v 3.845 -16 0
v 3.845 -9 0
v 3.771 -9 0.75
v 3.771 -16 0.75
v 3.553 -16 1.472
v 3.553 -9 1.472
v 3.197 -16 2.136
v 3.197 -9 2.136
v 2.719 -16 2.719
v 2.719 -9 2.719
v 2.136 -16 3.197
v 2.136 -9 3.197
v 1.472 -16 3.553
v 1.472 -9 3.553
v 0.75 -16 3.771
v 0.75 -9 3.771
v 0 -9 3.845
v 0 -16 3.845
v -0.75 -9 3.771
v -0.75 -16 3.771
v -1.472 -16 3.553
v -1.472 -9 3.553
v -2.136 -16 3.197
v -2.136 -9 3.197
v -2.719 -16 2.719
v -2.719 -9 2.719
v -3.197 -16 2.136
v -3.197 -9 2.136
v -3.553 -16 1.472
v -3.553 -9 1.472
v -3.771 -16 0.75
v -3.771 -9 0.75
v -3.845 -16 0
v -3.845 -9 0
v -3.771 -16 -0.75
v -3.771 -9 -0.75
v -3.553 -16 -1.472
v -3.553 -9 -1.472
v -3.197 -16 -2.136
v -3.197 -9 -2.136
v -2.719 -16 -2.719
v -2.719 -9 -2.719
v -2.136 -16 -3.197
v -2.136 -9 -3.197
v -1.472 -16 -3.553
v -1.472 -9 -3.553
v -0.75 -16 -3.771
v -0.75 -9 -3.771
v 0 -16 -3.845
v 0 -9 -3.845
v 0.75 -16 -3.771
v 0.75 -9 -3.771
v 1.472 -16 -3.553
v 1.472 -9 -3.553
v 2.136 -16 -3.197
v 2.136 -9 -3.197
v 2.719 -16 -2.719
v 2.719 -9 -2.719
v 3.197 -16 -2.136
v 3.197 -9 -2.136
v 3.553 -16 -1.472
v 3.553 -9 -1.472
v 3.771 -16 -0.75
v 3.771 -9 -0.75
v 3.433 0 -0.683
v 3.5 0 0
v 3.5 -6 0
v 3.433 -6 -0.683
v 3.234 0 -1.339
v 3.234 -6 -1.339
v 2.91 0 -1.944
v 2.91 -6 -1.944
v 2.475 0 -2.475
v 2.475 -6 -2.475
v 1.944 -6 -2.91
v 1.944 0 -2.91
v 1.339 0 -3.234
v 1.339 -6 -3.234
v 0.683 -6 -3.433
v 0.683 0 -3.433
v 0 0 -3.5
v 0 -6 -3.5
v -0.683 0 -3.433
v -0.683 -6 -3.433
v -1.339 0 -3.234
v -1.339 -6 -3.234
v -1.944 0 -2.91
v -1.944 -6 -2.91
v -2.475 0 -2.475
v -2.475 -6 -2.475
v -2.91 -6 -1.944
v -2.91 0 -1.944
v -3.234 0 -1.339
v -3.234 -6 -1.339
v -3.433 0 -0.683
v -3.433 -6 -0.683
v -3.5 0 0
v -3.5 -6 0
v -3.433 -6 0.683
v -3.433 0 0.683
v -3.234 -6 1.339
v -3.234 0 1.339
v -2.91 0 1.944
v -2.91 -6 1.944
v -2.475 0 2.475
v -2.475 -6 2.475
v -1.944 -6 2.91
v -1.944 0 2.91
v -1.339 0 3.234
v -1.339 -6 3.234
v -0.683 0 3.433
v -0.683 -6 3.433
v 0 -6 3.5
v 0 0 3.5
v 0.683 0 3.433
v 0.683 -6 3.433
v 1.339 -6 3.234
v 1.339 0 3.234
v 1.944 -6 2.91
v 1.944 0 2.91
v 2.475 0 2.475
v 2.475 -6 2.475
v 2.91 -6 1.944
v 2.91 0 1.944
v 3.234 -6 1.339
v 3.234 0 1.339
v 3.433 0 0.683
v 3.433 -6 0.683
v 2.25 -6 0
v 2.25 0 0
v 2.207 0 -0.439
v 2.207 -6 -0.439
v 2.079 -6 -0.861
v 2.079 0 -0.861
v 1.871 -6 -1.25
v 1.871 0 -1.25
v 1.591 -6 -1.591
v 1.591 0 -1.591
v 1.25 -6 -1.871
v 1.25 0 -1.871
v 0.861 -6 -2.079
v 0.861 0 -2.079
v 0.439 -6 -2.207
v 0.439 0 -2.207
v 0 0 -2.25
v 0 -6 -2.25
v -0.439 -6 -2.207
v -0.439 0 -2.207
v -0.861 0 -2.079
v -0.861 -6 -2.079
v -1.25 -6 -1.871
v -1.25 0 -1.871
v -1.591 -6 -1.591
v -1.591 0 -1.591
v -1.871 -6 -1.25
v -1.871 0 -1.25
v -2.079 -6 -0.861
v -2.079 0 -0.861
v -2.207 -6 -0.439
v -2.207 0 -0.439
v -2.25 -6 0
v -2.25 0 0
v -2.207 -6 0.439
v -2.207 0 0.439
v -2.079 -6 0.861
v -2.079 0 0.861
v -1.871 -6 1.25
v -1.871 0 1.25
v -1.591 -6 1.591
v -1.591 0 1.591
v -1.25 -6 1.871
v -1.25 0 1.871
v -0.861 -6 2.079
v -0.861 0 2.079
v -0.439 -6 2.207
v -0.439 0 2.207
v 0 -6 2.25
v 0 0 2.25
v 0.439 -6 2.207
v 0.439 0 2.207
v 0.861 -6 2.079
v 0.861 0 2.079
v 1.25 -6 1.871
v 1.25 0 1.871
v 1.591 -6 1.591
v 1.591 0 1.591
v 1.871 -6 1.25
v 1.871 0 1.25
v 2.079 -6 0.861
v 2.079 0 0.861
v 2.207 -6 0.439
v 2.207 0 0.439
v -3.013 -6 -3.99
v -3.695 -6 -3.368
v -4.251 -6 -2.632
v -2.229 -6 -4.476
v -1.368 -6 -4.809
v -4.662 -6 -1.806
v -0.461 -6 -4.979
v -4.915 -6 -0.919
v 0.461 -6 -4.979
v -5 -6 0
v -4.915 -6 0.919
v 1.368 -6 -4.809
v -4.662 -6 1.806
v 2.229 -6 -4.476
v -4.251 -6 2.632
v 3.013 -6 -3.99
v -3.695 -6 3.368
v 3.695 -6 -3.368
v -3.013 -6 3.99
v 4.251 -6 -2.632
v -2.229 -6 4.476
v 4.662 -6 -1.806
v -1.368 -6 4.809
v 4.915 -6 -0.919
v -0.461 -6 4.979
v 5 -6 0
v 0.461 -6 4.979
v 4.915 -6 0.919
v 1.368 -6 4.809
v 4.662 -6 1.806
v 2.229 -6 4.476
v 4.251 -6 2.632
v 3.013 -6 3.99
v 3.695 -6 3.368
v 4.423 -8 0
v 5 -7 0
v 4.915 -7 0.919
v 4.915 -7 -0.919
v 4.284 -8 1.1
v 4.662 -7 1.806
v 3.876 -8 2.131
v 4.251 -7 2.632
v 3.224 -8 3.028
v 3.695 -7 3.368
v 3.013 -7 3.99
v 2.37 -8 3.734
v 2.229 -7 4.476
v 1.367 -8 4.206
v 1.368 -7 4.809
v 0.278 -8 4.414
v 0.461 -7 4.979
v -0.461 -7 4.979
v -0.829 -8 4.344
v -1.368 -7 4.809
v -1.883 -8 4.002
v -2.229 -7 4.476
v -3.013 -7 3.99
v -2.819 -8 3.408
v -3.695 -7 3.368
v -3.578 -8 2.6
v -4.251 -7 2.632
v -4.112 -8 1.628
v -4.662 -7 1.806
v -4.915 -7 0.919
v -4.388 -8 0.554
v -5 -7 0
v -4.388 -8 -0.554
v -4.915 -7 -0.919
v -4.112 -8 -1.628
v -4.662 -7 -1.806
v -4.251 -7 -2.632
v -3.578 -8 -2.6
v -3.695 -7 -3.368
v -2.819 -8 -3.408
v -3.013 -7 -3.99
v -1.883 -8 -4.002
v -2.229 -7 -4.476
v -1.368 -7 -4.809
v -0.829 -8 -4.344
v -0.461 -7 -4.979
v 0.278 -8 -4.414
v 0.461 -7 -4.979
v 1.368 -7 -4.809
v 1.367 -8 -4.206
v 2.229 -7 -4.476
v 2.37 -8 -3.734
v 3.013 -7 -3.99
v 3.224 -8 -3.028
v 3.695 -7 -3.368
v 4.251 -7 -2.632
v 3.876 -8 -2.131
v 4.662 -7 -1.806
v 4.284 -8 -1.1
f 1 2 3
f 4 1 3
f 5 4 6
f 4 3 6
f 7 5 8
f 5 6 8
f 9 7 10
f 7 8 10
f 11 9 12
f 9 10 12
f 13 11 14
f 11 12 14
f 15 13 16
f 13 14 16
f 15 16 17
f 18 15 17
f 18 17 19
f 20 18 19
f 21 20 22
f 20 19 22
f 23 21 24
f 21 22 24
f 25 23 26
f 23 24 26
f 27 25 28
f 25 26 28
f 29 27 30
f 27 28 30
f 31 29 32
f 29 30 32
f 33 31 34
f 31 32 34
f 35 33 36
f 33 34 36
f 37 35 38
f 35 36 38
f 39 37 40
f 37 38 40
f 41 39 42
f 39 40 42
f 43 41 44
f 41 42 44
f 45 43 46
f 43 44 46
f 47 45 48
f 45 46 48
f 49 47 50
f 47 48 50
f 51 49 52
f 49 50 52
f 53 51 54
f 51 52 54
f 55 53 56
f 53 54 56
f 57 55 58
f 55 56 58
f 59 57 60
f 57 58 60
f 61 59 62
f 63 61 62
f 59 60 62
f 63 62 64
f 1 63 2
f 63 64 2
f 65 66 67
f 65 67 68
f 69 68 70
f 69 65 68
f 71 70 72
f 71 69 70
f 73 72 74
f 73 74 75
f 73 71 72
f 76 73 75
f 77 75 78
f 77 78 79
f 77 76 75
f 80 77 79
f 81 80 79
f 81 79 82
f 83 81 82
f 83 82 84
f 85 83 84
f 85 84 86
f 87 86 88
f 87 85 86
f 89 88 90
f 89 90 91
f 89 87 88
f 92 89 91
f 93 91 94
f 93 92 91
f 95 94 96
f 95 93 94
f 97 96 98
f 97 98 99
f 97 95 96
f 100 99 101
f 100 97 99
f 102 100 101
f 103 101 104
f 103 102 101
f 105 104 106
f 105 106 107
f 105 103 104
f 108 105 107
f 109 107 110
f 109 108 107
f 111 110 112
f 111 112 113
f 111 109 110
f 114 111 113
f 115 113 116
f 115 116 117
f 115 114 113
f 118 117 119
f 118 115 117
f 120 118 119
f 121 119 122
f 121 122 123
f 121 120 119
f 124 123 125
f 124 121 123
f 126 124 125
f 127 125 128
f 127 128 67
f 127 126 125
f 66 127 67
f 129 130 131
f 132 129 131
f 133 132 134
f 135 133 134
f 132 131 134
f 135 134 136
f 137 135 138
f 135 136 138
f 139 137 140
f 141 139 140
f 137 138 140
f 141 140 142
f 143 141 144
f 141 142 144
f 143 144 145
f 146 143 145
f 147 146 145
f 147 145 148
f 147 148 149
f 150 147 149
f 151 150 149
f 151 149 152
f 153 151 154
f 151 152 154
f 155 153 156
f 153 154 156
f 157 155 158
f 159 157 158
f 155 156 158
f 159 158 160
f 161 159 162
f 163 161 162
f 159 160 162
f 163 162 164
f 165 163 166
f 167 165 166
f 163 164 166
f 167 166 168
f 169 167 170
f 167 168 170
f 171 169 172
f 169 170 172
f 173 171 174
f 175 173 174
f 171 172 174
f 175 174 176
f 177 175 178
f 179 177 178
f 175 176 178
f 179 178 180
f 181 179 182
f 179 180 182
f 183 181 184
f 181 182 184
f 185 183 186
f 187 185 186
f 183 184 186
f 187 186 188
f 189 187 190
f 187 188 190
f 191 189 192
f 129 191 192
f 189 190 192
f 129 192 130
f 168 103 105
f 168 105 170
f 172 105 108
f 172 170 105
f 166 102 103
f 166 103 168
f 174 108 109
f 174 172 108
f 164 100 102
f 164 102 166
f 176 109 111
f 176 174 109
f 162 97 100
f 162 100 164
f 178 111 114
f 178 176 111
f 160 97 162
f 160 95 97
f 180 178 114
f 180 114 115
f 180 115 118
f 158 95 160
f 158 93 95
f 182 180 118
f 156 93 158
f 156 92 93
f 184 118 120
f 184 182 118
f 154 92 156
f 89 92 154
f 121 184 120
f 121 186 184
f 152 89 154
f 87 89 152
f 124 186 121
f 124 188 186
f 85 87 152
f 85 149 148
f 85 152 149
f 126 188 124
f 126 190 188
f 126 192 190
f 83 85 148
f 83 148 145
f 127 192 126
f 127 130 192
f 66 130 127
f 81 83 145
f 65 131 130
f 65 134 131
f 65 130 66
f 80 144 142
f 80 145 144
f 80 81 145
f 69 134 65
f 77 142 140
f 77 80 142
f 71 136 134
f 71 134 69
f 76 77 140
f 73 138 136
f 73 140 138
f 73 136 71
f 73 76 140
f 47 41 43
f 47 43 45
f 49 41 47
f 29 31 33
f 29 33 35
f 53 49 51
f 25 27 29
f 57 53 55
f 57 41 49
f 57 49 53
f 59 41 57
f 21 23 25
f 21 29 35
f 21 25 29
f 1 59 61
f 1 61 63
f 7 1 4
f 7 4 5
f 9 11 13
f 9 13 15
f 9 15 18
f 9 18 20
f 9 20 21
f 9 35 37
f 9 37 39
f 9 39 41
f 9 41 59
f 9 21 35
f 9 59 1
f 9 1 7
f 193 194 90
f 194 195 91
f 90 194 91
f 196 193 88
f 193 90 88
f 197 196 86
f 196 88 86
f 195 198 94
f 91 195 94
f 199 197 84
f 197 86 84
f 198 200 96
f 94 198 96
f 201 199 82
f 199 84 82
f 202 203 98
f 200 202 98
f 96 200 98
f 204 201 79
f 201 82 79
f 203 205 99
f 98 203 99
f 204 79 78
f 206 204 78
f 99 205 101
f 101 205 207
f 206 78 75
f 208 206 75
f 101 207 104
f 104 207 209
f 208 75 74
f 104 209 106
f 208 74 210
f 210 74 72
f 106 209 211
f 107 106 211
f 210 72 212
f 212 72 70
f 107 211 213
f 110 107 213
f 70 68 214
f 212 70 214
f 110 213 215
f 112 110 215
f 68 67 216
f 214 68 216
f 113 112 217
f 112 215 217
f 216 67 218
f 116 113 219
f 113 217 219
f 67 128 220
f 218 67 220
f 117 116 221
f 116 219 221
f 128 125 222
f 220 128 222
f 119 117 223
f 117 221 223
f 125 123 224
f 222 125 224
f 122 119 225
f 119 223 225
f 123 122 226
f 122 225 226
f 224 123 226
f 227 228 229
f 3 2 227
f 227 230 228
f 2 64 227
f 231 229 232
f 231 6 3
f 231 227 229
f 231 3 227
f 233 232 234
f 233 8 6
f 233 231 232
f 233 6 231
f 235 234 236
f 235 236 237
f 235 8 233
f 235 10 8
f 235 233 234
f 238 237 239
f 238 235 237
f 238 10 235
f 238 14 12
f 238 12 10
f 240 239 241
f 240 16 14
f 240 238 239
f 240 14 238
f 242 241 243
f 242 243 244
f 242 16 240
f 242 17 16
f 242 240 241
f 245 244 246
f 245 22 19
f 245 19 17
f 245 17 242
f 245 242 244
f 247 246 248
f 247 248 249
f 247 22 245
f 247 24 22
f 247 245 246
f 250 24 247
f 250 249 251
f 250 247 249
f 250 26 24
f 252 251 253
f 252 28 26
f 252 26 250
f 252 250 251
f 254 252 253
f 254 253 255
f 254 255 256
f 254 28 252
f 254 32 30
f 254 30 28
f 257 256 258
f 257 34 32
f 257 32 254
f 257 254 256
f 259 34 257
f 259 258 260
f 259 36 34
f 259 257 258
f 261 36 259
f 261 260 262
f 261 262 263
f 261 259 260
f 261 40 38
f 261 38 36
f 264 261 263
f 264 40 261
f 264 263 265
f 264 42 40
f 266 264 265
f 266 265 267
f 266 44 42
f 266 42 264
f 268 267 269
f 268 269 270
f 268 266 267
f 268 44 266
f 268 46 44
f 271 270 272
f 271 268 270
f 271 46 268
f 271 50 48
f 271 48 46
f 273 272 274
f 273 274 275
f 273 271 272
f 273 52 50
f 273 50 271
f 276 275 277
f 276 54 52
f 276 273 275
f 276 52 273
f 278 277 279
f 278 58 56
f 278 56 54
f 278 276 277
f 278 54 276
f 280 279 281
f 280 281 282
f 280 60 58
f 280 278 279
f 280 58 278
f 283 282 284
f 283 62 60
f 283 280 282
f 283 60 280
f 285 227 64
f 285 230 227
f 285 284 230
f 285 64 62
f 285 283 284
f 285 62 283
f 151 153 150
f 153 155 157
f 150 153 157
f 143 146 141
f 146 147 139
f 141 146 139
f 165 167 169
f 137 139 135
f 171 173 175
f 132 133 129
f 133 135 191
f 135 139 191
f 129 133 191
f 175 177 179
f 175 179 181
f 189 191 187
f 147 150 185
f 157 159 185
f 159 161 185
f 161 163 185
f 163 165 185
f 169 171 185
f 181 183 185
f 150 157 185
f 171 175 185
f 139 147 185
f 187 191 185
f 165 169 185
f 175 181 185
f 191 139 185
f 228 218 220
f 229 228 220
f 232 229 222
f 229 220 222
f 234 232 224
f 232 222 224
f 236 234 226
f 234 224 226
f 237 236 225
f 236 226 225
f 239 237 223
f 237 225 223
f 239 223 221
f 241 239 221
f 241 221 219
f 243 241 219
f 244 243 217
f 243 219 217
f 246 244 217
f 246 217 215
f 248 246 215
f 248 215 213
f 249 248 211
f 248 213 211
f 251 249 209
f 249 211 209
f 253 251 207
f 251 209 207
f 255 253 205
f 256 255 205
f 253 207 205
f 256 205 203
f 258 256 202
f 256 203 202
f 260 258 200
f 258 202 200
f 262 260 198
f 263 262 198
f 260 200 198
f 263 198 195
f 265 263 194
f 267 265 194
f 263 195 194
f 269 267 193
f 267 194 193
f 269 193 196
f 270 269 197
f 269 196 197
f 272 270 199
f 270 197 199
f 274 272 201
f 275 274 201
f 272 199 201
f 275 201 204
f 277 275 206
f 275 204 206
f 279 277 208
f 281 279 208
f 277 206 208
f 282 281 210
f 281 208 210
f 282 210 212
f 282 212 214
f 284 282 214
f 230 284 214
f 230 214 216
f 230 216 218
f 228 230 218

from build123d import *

# Parameters (mm, degrees)
SKETCH1_R           = 3.5
SKETCH1_R_2         = 2.25
BOSS_EXTRUDE1_DEPTH = 6
SKETCH2_R           = 5
BOSS_EXTRUDE2_DEPTH = 1
SKETCH4_R           = 5
BOSS_EXTRUDE4_DEPTH = 2
BOSS_EXTRUDE4_TAPER = 30
SKETCH5_R           = 3.845299462
BOSS_EXTRUDE5_DEPTH = 7


with BuildPart() as part:
    # Sketch1 → Boss-Extrude1 (new body)
    with BuildSketch(Plane(origin=(0, 0, 0), x_dir=(1, 0, 0), z_dir=(0, 1, 0))):
        Circle(SKETCH1_R)
        Circle(SKETCH1_R_2, mode=Mode.SUBTRACT)
    extrude(amount=-BOSS_EXTRUDE1_DEPTH)

    # Sketch2 → Boss-Extrude2 (add)
    with BuildSketch(Plane.XZ.offset(6)):
        Circle(SKETCH2_R)
    extrude(amount=BOSS_EXTRUDE2_DEPTH)

    # Sketch4 → Boss-Extrude4 (add)
    with BuildSketch(Plane.XZ.offset(7)):
        Circle(SKETCH4_R)
    extrude(amount=BOSS_EXTRUDE4_DEPTH, taper=BOSS_EXTRUDE4_TAPER)

    # Sketch5 → Boss-Extrude5 (add)
    with BuildSketch(Plane.XZ.offset(9)):
        Circle(SKETCH5_R)
    extrude(amount=BOSS_EXTRUDE5_DEPTH)


solid = part.part
